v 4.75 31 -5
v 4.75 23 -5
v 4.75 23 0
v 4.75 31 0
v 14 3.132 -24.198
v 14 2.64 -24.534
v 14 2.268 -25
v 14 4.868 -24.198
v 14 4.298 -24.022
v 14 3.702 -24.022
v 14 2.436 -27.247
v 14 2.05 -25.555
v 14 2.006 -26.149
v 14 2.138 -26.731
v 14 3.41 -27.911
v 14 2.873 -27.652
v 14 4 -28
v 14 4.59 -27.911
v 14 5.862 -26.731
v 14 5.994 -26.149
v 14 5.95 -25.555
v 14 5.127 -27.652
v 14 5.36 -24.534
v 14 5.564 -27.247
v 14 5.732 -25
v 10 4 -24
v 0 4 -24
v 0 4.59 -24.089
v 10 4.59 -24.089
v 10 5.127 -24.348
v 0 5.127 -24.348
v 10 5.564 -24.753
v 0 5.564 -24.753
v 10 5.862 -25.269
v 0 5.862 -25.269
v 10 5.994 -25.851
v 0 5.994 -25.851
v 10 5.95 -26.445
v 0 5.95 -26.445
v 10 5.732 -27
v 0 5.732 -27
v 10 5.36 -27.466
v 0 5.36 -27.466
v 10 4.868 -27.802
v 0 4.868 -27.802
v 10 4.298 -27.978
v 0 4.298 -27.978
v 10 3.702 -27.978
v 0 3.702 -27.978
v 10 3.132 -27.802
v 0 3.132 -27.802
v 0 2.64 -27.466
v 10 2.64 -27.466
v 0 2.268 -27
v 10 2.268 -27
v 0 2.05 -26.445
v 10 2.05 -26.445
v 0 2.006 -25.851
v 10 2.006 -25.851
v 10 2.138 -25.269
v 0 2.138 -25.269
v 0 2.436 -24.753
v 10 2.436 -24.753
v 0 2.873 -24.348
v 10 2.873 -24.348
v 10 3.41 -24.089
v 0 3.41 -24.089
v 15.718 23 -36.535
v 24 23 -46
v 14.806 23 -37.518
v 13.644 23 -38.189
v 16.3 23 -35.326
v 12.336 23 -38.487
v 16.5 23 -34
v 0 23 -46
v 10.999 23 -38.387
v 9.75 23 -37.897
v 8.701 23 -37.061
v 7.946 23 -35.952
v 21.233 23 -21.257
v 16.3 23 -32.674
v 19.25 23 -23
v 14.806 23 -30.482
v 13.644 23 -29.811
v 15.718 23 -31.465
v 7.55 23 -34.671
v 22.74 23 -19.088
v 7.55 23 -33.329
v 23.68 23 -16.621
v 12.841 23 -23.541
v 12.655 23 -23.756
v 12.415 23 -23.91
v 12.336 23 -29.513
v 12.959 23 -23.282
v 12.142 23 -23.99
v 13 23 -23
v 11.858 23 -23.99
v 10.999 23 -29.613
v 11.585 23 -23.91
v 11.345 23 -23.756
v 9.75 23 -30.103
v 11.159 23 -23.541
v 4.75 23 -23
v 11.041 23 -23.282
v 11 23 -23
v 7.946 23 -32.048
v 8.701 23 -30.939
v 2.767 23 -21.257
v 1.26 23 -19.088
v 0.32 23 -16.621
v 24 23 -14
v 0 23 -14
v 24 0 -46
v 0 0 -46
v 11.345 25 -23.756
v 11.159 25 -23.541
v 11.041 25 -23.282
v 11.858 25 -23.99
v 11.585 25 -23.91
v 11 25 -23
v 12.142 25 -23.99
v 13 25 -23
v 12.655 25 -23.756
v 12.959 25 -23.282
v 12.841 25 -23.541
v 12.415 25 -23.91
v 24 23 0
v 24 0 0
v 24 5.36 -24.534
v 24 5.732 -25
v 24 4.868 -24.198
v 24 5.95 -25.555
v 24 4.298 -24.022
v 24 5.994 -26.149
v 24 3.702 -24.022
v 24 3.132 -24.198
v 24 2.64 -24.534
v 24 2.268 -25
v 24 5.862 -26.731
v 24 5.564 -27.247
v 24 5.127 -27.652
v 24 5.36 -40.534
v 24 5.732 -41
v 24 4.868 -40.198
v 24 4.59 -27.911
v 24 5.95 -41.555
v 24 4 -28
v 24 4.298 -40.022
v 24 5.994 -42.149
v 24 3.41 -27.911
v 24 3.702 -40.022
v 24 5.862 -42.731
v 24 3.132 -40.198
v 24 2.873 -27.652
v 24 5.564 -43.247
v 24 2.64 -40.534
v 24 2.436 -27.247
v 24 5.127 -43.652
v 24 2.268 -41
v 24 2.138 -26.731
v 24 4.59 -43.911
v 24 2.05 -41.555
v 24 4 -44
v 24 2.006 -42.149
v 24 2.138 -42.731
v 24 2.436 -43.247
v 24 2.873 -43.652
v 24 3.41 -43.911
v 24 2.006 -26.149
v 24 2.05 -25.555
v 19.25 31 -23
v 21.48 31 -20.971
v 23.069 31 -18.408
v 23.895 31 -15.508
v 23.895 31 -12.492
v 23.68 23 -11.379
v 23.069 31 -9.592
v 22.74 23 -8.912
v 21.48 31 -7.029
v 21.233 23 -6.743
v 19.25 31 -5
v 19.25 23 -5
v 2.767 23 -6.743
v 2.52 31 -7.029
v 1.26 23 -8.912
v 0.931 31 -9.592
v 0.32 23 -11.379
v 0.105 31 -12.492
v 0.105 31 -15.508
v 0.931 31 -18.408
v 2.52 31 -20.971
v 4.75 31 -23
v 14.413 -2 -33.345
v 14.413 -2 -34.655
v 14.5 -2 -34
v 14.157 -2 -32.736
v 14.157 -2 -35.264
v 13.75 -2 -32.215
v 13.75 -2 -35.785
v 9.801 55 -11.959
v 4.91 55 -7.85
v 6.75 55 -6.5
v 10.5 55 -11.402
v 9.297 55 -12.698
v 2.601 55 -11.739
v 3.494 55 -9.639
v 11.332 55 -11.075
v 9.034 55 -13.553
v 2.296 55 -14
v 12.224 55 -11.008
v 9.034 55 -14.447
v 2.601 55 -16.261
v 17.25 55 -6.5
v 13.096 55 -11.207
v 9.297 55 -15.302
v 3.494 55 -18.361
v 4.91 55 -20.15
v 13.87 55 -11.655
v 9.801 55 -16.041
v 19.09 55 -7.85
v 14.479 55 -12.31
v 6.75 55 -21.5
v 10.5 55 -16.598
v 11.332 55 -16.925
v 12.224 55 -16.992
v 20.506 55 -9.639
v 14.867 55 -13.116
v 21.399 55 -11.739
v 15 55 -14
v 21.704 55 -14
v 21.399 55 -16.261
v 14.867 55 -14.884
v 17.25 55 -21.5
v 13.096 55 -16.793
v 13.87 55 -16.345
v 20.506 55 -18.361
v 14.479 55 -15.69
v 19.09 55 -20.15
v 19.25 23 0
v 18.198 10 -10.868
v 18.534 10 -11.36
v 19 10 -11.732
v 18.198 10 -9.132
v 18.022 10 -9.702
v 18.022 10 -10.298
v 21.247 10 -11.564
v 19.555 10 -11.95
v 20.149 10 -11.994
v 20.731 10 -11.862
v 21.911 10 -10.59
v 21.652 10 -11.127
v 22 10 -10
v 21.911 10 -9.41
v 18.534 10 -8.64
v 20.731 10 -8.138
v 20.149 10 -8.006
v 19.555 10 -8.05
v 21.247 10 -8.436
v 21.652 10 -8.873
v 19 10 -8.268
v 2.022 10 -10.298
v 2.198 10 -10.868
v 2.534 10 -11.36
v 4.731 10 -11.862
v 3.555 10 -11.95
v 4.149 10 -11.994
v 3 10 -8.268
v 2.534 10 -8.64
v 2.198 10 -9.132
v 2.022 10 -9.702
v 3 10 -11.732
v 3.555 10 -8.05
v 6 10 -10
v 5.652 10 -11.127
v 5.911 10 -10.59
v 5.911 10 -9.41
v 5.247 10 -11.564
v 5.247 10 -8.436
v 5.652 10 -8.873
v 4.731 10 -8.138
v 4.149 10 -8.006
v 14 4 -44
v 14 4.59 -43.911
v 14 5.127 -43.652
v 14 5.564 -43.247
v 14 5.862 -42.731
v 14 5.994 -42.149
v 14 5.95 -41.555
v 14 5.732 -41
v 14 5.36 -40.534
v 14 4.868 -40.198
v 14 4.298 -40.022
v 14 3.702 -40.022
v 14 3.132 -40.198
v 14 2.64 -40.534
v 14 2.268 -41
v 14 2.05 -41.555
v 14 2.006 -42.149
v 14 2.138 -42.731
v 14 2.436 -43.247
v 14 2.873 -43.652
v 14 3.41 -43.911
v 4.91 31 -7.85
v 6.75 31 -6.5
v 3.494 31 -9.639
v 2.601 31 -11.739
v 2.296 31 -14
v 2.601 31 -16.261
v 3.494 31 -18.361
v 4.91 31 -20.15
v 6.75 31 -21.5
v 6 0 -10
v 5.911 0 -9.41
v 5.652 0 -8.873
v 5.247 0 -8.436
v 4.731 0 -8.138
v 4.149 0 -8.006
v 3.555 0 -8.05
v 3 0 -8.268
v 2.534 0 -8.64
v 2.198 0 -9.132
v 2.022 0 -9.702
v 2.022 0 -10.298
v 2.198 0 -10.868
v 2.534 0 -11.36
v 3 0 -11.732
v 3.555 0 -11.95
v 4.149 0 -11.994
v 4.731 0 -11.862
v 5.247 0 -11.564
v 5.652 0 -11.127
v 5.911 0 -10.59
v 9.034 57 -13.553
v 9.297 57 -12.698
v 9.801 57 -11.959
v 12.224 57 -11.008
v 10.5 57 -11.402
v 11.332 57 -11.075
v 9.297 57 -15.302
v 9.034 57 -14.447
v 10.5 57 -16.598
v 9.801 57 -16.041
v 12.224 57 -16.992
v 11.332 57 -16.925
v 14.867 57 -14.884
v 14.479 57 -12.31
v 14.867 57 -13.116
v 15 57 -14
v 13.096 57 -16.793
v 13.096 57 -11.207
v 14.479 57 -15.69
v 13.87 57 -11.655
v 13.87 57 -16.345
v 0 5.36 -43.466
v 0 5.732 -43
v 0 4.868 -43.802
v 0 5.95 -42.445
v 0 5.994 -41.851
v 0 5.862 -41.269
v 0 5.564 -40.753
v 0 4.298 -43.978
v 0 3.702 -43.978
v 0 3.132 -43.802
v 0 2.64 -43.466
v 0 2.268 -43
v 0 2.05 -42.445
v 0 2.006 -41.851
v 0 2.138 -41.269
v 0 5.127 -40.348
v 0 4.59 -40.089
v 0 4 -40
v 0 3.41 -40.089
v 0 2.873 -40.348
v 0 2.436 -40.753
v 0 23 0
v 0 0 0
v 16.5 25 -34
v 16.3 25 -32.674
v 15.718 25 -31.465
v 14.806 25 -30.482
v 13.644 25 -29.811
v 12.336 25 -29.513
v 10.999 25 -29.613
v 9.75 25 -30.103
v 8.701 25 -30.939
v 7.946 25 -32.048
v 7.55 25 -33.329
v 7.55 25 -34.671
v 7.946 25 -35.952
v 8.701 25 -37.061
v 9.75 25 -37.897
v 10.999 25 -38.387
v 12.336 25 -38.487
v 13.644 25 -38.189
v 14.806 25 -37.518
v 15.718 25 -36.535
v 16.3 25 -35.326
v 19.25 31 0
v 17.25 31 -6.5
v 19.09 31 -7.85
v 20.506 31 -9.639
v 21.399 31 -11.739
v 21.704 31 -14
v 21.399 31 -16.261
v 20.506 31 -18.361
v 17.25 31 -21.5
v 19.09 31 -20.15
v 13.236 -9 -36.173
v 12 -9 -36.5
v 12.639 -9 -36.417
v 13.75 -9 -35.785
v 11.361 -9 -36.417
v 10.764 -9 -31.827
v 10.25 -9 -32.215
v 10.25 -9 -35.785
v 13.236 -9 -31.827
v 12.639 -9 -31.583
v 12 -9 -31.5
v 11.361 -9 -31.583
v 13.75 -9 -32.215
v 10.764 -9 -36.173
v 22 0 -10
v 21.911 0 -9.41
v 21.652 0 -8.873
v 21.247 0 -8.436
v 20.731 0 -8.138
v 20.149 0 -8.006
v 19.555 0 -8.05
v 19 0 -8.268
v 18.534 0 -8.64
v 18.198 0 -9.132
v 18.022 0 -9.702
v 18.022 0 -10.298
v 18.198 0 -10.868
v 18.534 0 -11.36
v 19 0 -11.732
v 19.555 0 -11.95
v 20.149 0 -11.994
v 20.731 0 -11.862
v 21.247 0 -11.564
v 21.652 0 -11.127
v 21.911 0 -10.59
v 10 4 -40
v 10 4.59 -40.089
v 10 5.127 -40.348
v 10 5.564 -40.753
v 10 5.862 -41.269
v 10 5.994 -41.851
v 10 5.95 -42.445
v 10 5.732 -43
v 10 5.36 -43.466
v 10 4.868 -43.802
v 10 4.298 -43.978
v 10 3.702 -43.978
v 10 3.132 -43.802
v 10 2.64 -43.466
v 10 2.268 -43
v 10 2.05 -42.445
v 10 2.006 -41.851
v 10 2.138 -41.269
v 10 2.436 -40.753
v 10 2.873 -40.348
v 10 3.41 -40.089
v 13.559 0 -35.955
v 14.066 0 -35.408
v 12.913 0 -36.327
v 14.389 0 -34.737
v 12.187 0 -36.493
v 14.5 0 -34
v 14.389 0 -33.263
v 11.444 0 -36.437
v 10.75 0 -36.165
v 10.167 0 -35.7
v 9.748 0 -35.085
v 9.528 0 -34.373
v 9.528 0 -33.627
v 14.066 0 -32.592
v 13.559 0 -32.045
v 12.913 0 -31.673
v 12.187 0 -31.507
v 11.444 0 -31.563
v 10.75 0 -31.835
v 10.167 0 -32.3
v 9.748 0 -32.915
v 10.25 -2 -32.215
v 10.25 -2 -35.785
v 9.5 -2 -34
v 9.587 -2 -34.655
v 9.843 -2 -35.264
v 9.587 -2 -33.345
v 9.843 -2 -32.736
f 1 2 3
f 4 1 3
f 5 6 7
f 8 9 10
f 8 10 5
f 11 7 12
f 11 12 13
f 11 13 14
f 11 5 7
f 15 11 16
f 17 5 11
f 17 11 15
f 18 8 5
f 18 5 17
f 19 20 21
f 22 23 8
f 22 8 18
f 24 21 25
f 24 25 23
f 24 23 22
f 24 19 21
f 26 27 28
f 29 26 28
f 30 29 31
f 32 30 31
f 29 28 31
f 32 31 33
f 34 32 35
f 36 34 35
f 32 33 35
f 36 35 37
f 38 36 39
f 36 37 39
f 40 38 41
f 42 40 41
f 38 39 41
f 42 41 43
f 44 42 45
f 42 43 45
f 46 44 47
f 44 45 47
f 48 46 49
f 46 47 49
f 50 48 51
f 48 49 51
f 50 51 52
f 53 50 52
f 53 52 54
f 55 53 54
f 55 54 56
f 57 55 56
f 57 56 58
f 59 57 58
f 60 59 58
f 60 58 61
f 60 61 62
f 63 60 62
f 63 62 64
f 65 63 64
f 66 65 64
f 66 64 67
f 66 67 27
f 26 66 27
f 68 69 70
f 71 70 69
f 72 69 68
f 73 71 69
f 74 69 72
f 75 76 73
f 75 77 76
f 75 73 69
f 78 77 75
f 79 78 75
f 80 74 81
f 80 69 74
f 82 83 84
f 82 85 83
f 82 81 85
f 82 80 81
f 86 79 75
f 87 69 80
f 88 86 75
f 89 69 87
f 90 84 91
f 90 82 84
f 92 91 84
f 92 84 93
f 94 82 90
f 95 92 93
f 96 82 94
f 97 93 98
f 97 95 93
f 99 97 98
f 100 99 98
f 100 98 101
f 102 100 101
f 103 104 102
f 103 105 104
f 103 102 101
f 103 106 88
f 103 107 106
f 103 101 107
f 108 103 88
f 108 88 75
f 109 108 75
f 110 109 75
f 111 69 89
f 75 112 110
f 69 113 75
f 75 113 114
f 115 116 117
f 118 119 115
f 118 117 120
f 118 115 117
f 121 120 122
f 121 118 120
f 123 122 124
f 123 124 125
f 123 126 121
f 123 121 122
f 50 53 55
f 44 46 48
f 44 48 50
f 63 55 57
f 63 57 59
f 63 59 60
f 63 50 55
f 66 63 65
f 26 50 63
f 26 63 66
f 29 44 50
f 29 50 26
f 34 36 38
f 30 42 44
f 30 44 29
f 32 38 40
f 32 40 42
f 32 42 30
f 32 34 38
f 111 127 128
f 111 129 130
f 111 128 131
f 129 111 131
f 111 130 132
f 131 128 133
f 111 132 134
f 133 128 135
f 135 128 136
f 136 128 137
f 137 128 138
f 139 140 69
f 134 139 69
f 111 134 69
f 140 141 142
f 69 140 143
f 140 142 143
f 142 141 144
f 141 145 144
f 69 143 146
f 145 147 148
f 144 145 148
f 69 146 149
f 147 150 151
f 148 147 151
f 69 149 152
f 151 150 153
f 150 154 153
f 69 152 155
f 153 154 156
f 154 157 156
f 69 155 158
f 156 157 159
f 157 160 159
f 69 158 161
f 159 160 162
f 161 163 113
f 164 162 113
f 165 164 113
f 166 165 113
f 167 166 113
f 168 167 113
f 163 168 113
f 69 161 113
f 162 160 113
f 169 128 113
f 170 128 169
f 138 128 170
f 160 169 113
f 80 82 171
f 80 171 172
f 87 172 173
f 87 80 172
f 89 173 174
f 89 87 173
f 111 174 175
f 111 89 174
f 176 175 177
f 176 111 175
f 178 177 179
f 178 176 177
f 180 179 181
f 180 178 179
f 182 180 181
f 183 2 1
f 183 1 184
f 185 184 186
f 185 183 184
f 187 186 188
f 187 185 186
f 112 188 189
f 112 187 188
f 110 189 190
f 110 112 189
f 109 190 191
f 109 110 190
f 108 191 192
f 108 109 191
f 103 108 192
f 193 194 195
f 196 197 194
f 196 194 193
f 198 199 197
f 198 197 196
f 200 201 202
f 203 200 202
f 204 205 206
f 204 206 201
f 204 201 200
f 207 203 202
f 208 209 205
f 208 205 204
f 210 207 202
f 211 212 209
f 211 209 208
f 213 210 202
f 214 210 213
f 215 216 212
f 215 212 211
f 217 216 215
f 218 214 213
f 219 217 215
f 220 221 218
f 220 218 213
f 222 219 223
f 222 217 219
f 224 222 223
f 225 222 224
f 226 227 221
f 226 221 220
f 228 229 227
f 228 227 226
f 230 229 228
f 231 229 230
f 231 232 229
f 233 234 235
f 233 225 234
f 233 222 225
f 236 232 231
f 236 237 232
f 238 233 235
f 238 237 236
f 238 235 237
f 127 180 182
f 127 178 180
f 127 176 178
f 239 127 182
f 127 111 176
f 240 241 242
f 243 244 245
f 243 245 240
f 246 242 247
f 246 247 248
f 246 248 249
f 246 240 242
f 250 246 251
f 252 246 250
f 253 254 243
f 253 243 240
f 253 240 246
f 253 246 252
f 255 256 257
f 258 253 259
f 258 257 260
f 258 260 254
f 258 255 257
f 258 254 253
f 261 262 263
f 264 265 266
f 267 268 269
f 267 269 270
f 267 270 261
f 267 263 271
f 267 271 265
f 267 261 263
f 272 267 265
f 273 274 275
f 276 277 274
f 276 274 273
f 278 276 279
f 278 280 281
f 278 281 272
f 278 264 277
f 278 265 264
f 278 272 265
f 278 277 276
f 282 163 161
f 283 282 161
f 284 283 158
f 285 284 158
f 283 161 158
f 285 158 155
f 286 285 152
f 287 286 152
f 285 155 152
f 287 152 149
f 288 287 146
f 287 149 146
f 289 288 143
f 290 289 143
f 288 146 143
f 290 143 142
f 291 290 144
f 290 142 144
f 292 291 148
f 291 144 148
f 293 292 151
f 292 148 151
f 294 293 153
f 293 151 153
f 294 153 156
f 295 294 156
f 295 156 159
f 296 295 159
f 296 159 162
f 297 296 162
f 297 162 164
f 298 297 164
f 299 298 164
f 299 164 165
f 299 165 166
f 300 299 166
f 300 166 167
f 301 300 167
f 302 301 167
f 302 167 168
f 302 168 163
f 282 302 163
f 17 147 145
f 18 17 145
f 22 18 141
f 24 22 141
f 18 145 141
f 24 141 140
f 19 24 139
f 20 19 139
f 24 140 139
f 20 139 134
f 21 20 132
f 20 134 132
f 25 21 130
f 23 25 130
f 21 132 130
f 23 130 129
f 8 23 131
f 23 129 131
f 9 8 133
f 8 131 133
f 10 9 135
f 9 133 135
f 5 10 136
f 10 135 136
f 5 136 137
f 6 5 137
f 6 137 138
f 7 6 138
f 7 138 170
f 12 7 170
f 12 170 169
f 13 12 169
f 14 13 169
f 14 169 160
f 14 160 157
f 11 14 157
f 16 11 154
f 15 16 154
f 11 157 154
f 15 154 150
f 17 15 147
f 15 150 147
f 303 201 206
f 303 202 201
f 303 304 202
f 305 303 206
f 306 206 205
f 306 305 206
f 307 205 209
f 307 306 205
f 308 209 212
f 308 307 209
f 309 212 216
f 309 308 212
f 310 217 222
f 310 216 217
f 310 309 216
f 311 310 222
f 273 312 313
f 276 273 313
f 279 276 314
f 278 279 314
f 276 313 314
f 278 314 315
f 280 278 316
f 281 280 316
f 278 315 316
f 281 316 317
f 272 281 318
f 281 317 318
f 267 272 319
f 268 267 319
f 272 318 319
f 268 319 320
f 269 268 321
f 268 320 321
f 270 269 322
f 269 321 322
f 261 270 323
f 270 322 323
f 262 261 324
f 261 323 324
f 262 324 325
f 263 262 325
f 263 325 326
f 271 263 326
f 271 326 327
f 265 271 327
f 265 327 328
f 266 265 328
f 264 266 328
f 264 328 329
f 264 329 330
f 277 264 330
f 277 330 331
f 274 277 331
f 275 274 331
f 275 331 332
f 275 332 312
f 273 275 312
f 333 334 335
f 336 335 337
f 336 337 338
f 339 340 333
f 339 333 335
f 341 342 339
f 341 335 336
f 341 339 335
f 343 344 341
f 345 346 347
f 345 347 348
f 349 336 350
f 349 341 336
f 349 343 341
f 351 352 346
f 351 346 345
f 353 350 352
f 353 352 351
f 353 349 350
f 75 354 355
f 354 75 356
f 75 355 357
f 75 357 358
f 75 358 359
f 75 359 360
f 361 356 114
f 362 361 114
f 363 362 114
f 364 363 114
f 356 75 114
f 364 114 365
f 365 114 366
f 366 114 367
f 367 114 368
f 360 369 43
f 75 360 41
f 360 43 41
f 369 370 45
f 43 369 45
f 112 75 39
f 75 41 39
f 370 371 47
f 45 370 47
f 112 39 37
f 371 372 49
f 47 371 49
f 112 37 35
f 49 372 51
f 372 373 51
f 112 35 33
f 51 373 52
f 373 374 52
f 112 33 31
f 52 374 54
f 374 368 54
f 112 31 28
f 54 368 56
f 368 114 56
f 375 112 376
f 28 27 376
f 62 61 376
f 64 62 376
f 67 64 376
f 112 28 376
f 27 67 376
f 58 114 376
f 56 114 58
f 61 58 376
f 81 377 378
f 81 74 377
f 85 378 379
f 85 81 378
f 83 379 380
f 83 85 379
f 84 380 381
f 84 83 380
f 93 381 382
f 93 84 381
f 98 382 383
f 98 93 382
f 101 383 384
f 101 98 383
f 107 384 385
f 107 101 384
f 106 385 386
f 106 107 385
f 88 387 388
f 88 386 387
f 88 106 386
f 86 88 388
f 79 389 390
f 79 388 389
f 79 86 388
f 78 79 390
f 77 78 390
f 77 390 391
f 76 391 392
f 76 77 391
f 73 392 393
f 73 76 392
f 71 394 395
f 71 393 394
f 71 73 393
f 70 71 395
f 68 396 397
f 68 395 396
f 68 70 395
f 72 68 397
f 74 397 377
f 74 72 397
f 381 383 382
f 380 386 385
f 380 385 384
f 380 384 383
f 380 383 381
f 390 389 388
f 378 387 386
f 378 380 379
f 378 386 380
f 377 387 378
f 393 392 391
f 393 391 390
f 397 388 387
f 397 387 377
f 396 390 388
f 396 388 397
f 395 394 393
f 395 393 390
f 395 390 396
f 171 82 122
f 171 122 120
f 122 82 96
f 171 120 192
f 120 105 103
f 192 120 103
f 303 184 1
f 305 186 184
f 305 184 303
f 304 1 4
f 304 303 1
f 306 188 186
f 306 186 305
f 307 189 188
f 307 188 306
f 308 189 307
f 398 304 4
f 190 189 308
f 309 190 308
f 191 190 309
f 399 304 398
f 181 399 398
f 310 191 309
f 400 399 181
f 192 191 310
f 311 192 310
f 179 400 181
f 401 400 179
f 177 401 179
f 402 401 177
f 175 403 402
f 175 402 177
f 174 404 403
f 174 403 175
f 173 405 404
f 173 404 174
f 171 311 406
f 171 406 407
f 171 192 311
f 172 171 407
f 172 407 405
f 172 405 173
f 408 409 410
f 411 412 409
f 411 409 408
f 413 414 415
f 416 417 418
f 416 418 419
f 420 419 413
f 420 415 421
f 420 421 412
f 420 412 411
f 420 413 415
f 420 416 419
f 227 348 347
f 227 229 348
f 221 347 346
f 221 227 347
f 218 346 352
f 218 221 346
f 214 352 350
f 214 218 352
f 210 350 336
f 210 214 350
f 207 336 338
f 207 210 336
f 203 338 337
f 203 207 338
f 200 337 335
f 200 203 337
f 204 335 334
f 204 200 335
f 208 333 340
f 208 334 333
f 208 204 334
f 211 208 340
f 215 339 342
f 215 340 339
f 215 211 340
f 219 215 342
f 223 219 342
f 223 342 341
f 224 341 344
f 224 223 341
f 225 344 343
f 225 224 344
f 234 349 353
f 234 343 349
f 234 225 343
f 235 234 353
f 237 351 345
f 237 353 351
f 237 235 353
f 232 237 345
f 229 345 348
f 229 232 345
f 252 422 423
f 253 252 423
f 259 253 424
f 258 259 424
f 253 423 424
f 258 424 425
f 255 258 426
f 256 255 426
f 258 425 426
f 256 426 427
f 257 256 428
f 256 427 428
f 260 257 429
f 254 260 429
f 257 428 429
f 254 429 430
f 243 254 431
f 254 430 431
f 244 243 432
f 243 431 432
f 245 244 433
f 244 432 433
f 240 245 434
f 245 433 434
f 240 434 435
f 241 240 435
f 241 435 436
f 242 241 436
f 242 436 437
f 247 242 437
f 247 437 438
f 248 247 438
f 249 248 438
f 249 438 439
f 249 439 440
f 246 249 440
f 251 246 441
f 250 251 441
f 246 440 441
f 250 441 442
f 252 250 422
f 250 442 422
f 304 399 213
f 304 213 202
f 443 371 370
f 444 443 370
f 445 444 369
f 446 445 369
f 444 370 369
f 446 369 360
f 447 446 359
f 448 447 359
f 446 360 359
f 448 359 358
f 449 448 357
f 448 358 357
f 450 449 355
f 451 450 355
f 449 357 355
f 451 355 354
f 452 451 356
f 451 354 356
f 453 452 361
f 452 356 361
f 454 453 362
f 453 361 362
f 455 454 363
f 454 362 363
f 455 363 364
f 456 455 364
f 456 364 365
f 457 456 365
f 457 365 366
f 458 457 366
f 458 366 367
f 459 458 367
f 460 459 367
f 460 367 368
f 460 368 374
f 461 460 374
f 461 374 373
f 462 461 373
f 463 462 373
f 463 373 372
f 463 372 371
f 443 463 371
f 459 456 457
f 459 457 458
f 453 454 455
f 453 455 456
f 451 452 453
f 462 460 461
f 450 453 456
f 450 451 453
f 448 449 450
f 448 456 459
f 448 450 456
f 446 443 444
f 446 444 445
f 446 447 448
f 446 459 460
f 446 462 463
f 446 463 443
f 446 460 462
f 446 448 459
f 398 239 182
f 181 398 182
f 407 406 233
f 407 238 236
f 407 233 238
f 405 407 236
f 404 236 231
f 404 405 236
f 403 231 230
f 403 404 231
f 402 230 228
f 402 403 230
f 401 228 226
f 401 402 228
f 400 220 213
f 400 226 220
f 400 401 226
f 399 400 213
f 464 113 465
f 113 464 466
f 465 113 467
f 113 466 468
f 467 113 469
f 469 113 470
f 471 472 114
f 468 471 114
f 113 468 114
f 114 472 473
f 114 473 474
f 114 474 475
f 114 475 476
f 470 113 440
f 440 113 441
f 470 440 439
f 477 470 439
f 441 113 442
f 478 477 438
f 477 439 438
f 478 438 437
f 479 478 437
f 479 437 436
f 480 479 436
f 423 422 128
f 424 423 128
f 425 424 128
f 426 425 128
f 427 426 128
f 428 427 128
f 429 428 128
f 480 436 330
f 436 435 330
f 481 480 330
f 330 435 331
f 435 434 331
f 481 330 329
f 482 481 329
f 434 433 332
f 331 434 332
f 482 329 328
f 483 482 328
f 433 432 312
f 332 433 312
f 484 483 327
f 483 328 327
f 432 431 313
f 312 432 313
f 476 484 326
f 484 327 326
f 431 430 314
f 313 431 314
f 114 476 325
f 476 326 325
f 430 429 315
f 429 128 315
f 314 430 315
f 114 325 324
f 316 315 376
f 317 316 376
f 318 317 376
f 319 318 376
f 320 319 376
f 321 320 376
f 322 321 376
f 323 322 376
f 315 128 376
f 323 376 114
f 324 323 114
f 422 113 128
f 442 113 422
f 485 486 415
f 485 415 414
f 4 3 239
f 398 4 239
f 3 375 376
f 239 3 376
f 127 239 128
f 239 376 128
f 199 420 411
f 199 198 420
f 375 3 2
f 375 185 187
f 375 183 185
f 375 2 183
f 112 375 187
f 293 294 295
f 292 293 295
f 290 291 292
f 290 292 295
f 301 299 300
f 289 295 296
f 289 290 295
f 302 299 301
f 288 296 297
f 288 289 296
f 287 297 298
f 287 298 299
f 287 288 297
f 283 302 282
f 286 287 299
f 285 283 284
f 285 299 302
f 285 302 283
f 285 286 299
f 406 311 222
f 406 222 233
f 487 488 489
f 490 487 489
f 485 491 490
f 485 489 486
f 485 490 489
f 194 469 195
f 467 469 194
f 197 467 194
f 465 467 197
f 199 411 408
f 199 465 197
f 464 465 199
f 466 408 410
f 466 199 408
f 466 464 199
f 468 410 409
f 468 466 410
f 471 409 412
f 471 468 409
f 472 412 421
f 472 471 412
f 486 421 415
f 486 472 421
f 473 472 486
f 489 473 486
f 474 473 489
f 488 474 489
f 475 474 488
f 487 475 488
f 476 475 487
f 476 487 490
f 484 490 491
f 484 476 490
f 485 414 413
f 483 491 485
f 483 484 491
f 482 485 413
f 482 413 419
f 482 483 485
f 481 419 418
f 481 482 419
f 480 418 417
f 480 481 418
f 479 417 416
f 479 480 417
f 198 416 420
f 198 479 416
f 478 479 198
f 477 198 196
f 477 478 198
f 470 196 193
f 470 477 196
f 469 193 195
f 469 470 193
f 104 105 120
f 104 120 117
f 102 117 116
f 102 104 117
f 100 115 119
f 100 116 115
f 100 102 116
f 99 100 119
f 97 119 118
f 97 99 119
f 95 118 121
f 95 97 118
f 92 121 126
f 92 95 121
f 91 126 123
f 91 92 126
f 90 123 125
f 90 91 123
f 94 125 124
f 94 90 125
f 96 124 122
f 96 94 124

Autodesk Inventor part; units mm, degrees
ref_plane "YZ Plane" through (0, 0, 0) normal (1, 0, 0) x (0, 1, 0)
ref_plane "XZ Plane" through (0, 0, 0) normal (0, 1, 0) x (-1, 0, 0)
ref_plane "XY Plane" through (0, 0, 0) normal (0, 0, 1) x (1, 0, 0)
sketch "Sketch1" plane through (0, 0, 0) normal (0, 1, 0) x (-1, 0, 0)
  line L0 (0, 0) -> (-24, 0)
  line L1 (-24, 0) -> (-24, -46)
  line L2 (-24, -46) -> (0, -46)
  line L3 (0, -46) -> (0, 0)
  dimension "d0" = 24
  dimension "d1" = 46
extrude "Extrusion1" add sketch "Sketch1" along normal blind 23
sketch "Sketch2" plane through (0, 23, 0) normal (0, 1, 0) x (1, 0, 0)
  line L0 (4.75, 0) -> (19.25, 0)
  line L1 (19.25, 0) -> (19.25, 5)
  line L2 (19.25, 23) -> (4.75, 23)
  line L3 (4.75, 5) -> (4.75, 0)
  line L4 (4.75, 0) -> (19.25, 23) construction
  line L5 (19.25, 0) -> (4.75, 23) construction
  line L6 (0, 0) -> (24, 0) projected
  arc A0 (13, 23) -> (11, 23) centre (12, 23) ccw
  arc A1 (4.75, 23) -> (4.75, 5) centre (10.9013, 14) ccw
  line L7 (0, 46) -> (0, 0) projected
  arc A2 (19.25, 5) -> (19.25, 23) centre (13.0987, 14) ccw
  line L8 (24, 0) -> (24, 46) projected
  circle A3 centre (12, 34) radius 4.5
  line L9 (24, 46) -> (0, 46) projected
  point P0 (12, 11.5)
  point P1 (12, 0)
  dimension "d4" = 14.5
  dimension "d5" = 23
  dimension "d6" = 2
  dimension "d8" = 9
  dimension "d9" = 12
extrude "Extrusion2" add sketch "Sketch2" along normal blind 2 contours A0 L2 | A3
extrude "Extrusion3" add sketch "Sketch2" along normal blind 8 contours L3 A1 L2 A2 L1 L0
sketch "Sketch3" plane through (0, 31, 0) normal (0, 1, 0) x (1, 0, 0)
  line L0 (17.25, 6.5) -> (6.75, 6.5)
  line L1 (6.75, 21.5) -> (17.25, 21.5)
  line L2 (17.25, 6.5) -> (6.75, 21.5) construction
  line L3 (6.75, 6.5) -> (17.25, 21.5) construction
  line L4 (19.25, 23) -> (4.75, 23) projected
  arc A0 (6.75, 21.5) -> (6.75, 6.5) centre (10.8385, 14) ccw
  arc A1 (17.25, 6.5) -> (17.25, 21.5) centre (13.1615, 14) ccw
  point P0 (0, 0)
  point P1 (12, 14)
  dimension "d17" = 8.542
  dimension "d18" = 8.542
extrude "Extrusion4" add sketch "Sketch3" along normal blind 24
sketch "Sketch4" plane through (0, 55, 0) normal (0, 1, 0) x (1, 0, 0)
  circle A0 centre (12, 14) radius 3
  line L0 (17.25, 21.5) -> (6.75, 21.5) projected
  line L1 (6.75, 6.5) -> (17.25, 6.5) projected
  point P0 (0, 0)
  dimension "d21" = 6
  dimension "d22" = 7.5
  dimension "d23" = 15
extrude "Extrusion5" add sketch "Sketch4" along normal blind 2
sketch "Sketch5" plane through (24, 0, 0) normal (1, 0, 0) x (0, 0, -1)
  circle A0 centre (42, 4) radius 2
  line L0 (46, 0) -> (46, 23) projected
  line L1 (0, 0) -> (46, 0) projected
  circle A1 centre (26, 4) radius 2
  dimension "d26" = 4
  dimension "d27" = 4
  dimension "d28" = 4
  dimension "d29" = 4
  dimension "d30" = 16
extrude "Extrusion6" cut sketch "Sketch5" against normal blind 10
sketch "Sketch6" plane through (0, 0, -46) normal (-1, 0, 0) x (0, 0, 1)
  circle A0 centre (4, 4) radius 2 projected
  circle A1 centre (4, 4) radius 2
  circle A2 centre (20, 4) radius 2 projected
  circle A3 centre (20, 4) radius 2
  point P0 (46, 0)
extrude "Extrusion7" cut sketch "Sketch6" against normal blind 10
sketch "Sketch7" plane through (0, 0, 0) normal (0, -1, 0) x (1, 0, 0)
  circle A0 centre (20, -10) radius 2
  line L0 (24, 0) -> (24, -46) projected
  line L1 (0, 0) -> (24, 0) projected
  circle A1 centre (4, -10) radius 2
  line L2 (0, -46) -> (0, 0) projected
  circle A2 centre (12, -34) radius 2.5
  line L3 (24, -46) -> (0, -46) projected
  point P0 (12, -46)
  dimension "d35" = 4
  dimension "d36" = 4
  dimension "d37" = 10
  dimension "d38" = 4
  dimension "d39" = 4
  dimension "d40" = 5
  dimension "d41" = 12
extrude "Extrusion8" cut sketch "Sketch7" against normal blind 10 contours A0 | A1
extrude "Extrusion9" add sketch "Sketch7" along normal blind 2 contours A2
sketch "Sketch8" plane through (12, -2, -34) normal (0, -1, 0) x (1, 0, 0)
  circle A0 centre (0, 0) radius 2.5 projected
  line L0 (1.75, -1.7854) -> (-1.75, -1.7854)
  line L1 (-1.75, -1.7854) -> (-1.75, 1.7854)
  line L2 (-1.75, 1.7854) -> (1.75, 1.7854)
  line L3 (1.75, 1.7854) -> (1.75, -1.7854)
  line L4 (1.75, -1.7854) -> (-1.75, 1.7854) construction
  line L5 (-1.75, -1.7854) -> (1.75, 1.7854) construction
  arc A1 (-1.75, -1.7854) -> (1.75, -1.7854) centre (0, 0) ccw
  arc A2 (1.75, 1.7854) -> (-1.75, 1.7854) centre (0, 0) ccw
  point P0 (-12, 34)
  point P1 (-1.75, -1.7854)
  point P2 (1.75, 1.7854)
  dimension "d46" = 3.5
  dimension "d47" = 3.5707
extrude "Extrusion10" add sketch "Sketch8" along normal blind 7 contours L2 A0 | L3 L0 L1 L2 | A0 L0
properties part number "Encoder Motor"
